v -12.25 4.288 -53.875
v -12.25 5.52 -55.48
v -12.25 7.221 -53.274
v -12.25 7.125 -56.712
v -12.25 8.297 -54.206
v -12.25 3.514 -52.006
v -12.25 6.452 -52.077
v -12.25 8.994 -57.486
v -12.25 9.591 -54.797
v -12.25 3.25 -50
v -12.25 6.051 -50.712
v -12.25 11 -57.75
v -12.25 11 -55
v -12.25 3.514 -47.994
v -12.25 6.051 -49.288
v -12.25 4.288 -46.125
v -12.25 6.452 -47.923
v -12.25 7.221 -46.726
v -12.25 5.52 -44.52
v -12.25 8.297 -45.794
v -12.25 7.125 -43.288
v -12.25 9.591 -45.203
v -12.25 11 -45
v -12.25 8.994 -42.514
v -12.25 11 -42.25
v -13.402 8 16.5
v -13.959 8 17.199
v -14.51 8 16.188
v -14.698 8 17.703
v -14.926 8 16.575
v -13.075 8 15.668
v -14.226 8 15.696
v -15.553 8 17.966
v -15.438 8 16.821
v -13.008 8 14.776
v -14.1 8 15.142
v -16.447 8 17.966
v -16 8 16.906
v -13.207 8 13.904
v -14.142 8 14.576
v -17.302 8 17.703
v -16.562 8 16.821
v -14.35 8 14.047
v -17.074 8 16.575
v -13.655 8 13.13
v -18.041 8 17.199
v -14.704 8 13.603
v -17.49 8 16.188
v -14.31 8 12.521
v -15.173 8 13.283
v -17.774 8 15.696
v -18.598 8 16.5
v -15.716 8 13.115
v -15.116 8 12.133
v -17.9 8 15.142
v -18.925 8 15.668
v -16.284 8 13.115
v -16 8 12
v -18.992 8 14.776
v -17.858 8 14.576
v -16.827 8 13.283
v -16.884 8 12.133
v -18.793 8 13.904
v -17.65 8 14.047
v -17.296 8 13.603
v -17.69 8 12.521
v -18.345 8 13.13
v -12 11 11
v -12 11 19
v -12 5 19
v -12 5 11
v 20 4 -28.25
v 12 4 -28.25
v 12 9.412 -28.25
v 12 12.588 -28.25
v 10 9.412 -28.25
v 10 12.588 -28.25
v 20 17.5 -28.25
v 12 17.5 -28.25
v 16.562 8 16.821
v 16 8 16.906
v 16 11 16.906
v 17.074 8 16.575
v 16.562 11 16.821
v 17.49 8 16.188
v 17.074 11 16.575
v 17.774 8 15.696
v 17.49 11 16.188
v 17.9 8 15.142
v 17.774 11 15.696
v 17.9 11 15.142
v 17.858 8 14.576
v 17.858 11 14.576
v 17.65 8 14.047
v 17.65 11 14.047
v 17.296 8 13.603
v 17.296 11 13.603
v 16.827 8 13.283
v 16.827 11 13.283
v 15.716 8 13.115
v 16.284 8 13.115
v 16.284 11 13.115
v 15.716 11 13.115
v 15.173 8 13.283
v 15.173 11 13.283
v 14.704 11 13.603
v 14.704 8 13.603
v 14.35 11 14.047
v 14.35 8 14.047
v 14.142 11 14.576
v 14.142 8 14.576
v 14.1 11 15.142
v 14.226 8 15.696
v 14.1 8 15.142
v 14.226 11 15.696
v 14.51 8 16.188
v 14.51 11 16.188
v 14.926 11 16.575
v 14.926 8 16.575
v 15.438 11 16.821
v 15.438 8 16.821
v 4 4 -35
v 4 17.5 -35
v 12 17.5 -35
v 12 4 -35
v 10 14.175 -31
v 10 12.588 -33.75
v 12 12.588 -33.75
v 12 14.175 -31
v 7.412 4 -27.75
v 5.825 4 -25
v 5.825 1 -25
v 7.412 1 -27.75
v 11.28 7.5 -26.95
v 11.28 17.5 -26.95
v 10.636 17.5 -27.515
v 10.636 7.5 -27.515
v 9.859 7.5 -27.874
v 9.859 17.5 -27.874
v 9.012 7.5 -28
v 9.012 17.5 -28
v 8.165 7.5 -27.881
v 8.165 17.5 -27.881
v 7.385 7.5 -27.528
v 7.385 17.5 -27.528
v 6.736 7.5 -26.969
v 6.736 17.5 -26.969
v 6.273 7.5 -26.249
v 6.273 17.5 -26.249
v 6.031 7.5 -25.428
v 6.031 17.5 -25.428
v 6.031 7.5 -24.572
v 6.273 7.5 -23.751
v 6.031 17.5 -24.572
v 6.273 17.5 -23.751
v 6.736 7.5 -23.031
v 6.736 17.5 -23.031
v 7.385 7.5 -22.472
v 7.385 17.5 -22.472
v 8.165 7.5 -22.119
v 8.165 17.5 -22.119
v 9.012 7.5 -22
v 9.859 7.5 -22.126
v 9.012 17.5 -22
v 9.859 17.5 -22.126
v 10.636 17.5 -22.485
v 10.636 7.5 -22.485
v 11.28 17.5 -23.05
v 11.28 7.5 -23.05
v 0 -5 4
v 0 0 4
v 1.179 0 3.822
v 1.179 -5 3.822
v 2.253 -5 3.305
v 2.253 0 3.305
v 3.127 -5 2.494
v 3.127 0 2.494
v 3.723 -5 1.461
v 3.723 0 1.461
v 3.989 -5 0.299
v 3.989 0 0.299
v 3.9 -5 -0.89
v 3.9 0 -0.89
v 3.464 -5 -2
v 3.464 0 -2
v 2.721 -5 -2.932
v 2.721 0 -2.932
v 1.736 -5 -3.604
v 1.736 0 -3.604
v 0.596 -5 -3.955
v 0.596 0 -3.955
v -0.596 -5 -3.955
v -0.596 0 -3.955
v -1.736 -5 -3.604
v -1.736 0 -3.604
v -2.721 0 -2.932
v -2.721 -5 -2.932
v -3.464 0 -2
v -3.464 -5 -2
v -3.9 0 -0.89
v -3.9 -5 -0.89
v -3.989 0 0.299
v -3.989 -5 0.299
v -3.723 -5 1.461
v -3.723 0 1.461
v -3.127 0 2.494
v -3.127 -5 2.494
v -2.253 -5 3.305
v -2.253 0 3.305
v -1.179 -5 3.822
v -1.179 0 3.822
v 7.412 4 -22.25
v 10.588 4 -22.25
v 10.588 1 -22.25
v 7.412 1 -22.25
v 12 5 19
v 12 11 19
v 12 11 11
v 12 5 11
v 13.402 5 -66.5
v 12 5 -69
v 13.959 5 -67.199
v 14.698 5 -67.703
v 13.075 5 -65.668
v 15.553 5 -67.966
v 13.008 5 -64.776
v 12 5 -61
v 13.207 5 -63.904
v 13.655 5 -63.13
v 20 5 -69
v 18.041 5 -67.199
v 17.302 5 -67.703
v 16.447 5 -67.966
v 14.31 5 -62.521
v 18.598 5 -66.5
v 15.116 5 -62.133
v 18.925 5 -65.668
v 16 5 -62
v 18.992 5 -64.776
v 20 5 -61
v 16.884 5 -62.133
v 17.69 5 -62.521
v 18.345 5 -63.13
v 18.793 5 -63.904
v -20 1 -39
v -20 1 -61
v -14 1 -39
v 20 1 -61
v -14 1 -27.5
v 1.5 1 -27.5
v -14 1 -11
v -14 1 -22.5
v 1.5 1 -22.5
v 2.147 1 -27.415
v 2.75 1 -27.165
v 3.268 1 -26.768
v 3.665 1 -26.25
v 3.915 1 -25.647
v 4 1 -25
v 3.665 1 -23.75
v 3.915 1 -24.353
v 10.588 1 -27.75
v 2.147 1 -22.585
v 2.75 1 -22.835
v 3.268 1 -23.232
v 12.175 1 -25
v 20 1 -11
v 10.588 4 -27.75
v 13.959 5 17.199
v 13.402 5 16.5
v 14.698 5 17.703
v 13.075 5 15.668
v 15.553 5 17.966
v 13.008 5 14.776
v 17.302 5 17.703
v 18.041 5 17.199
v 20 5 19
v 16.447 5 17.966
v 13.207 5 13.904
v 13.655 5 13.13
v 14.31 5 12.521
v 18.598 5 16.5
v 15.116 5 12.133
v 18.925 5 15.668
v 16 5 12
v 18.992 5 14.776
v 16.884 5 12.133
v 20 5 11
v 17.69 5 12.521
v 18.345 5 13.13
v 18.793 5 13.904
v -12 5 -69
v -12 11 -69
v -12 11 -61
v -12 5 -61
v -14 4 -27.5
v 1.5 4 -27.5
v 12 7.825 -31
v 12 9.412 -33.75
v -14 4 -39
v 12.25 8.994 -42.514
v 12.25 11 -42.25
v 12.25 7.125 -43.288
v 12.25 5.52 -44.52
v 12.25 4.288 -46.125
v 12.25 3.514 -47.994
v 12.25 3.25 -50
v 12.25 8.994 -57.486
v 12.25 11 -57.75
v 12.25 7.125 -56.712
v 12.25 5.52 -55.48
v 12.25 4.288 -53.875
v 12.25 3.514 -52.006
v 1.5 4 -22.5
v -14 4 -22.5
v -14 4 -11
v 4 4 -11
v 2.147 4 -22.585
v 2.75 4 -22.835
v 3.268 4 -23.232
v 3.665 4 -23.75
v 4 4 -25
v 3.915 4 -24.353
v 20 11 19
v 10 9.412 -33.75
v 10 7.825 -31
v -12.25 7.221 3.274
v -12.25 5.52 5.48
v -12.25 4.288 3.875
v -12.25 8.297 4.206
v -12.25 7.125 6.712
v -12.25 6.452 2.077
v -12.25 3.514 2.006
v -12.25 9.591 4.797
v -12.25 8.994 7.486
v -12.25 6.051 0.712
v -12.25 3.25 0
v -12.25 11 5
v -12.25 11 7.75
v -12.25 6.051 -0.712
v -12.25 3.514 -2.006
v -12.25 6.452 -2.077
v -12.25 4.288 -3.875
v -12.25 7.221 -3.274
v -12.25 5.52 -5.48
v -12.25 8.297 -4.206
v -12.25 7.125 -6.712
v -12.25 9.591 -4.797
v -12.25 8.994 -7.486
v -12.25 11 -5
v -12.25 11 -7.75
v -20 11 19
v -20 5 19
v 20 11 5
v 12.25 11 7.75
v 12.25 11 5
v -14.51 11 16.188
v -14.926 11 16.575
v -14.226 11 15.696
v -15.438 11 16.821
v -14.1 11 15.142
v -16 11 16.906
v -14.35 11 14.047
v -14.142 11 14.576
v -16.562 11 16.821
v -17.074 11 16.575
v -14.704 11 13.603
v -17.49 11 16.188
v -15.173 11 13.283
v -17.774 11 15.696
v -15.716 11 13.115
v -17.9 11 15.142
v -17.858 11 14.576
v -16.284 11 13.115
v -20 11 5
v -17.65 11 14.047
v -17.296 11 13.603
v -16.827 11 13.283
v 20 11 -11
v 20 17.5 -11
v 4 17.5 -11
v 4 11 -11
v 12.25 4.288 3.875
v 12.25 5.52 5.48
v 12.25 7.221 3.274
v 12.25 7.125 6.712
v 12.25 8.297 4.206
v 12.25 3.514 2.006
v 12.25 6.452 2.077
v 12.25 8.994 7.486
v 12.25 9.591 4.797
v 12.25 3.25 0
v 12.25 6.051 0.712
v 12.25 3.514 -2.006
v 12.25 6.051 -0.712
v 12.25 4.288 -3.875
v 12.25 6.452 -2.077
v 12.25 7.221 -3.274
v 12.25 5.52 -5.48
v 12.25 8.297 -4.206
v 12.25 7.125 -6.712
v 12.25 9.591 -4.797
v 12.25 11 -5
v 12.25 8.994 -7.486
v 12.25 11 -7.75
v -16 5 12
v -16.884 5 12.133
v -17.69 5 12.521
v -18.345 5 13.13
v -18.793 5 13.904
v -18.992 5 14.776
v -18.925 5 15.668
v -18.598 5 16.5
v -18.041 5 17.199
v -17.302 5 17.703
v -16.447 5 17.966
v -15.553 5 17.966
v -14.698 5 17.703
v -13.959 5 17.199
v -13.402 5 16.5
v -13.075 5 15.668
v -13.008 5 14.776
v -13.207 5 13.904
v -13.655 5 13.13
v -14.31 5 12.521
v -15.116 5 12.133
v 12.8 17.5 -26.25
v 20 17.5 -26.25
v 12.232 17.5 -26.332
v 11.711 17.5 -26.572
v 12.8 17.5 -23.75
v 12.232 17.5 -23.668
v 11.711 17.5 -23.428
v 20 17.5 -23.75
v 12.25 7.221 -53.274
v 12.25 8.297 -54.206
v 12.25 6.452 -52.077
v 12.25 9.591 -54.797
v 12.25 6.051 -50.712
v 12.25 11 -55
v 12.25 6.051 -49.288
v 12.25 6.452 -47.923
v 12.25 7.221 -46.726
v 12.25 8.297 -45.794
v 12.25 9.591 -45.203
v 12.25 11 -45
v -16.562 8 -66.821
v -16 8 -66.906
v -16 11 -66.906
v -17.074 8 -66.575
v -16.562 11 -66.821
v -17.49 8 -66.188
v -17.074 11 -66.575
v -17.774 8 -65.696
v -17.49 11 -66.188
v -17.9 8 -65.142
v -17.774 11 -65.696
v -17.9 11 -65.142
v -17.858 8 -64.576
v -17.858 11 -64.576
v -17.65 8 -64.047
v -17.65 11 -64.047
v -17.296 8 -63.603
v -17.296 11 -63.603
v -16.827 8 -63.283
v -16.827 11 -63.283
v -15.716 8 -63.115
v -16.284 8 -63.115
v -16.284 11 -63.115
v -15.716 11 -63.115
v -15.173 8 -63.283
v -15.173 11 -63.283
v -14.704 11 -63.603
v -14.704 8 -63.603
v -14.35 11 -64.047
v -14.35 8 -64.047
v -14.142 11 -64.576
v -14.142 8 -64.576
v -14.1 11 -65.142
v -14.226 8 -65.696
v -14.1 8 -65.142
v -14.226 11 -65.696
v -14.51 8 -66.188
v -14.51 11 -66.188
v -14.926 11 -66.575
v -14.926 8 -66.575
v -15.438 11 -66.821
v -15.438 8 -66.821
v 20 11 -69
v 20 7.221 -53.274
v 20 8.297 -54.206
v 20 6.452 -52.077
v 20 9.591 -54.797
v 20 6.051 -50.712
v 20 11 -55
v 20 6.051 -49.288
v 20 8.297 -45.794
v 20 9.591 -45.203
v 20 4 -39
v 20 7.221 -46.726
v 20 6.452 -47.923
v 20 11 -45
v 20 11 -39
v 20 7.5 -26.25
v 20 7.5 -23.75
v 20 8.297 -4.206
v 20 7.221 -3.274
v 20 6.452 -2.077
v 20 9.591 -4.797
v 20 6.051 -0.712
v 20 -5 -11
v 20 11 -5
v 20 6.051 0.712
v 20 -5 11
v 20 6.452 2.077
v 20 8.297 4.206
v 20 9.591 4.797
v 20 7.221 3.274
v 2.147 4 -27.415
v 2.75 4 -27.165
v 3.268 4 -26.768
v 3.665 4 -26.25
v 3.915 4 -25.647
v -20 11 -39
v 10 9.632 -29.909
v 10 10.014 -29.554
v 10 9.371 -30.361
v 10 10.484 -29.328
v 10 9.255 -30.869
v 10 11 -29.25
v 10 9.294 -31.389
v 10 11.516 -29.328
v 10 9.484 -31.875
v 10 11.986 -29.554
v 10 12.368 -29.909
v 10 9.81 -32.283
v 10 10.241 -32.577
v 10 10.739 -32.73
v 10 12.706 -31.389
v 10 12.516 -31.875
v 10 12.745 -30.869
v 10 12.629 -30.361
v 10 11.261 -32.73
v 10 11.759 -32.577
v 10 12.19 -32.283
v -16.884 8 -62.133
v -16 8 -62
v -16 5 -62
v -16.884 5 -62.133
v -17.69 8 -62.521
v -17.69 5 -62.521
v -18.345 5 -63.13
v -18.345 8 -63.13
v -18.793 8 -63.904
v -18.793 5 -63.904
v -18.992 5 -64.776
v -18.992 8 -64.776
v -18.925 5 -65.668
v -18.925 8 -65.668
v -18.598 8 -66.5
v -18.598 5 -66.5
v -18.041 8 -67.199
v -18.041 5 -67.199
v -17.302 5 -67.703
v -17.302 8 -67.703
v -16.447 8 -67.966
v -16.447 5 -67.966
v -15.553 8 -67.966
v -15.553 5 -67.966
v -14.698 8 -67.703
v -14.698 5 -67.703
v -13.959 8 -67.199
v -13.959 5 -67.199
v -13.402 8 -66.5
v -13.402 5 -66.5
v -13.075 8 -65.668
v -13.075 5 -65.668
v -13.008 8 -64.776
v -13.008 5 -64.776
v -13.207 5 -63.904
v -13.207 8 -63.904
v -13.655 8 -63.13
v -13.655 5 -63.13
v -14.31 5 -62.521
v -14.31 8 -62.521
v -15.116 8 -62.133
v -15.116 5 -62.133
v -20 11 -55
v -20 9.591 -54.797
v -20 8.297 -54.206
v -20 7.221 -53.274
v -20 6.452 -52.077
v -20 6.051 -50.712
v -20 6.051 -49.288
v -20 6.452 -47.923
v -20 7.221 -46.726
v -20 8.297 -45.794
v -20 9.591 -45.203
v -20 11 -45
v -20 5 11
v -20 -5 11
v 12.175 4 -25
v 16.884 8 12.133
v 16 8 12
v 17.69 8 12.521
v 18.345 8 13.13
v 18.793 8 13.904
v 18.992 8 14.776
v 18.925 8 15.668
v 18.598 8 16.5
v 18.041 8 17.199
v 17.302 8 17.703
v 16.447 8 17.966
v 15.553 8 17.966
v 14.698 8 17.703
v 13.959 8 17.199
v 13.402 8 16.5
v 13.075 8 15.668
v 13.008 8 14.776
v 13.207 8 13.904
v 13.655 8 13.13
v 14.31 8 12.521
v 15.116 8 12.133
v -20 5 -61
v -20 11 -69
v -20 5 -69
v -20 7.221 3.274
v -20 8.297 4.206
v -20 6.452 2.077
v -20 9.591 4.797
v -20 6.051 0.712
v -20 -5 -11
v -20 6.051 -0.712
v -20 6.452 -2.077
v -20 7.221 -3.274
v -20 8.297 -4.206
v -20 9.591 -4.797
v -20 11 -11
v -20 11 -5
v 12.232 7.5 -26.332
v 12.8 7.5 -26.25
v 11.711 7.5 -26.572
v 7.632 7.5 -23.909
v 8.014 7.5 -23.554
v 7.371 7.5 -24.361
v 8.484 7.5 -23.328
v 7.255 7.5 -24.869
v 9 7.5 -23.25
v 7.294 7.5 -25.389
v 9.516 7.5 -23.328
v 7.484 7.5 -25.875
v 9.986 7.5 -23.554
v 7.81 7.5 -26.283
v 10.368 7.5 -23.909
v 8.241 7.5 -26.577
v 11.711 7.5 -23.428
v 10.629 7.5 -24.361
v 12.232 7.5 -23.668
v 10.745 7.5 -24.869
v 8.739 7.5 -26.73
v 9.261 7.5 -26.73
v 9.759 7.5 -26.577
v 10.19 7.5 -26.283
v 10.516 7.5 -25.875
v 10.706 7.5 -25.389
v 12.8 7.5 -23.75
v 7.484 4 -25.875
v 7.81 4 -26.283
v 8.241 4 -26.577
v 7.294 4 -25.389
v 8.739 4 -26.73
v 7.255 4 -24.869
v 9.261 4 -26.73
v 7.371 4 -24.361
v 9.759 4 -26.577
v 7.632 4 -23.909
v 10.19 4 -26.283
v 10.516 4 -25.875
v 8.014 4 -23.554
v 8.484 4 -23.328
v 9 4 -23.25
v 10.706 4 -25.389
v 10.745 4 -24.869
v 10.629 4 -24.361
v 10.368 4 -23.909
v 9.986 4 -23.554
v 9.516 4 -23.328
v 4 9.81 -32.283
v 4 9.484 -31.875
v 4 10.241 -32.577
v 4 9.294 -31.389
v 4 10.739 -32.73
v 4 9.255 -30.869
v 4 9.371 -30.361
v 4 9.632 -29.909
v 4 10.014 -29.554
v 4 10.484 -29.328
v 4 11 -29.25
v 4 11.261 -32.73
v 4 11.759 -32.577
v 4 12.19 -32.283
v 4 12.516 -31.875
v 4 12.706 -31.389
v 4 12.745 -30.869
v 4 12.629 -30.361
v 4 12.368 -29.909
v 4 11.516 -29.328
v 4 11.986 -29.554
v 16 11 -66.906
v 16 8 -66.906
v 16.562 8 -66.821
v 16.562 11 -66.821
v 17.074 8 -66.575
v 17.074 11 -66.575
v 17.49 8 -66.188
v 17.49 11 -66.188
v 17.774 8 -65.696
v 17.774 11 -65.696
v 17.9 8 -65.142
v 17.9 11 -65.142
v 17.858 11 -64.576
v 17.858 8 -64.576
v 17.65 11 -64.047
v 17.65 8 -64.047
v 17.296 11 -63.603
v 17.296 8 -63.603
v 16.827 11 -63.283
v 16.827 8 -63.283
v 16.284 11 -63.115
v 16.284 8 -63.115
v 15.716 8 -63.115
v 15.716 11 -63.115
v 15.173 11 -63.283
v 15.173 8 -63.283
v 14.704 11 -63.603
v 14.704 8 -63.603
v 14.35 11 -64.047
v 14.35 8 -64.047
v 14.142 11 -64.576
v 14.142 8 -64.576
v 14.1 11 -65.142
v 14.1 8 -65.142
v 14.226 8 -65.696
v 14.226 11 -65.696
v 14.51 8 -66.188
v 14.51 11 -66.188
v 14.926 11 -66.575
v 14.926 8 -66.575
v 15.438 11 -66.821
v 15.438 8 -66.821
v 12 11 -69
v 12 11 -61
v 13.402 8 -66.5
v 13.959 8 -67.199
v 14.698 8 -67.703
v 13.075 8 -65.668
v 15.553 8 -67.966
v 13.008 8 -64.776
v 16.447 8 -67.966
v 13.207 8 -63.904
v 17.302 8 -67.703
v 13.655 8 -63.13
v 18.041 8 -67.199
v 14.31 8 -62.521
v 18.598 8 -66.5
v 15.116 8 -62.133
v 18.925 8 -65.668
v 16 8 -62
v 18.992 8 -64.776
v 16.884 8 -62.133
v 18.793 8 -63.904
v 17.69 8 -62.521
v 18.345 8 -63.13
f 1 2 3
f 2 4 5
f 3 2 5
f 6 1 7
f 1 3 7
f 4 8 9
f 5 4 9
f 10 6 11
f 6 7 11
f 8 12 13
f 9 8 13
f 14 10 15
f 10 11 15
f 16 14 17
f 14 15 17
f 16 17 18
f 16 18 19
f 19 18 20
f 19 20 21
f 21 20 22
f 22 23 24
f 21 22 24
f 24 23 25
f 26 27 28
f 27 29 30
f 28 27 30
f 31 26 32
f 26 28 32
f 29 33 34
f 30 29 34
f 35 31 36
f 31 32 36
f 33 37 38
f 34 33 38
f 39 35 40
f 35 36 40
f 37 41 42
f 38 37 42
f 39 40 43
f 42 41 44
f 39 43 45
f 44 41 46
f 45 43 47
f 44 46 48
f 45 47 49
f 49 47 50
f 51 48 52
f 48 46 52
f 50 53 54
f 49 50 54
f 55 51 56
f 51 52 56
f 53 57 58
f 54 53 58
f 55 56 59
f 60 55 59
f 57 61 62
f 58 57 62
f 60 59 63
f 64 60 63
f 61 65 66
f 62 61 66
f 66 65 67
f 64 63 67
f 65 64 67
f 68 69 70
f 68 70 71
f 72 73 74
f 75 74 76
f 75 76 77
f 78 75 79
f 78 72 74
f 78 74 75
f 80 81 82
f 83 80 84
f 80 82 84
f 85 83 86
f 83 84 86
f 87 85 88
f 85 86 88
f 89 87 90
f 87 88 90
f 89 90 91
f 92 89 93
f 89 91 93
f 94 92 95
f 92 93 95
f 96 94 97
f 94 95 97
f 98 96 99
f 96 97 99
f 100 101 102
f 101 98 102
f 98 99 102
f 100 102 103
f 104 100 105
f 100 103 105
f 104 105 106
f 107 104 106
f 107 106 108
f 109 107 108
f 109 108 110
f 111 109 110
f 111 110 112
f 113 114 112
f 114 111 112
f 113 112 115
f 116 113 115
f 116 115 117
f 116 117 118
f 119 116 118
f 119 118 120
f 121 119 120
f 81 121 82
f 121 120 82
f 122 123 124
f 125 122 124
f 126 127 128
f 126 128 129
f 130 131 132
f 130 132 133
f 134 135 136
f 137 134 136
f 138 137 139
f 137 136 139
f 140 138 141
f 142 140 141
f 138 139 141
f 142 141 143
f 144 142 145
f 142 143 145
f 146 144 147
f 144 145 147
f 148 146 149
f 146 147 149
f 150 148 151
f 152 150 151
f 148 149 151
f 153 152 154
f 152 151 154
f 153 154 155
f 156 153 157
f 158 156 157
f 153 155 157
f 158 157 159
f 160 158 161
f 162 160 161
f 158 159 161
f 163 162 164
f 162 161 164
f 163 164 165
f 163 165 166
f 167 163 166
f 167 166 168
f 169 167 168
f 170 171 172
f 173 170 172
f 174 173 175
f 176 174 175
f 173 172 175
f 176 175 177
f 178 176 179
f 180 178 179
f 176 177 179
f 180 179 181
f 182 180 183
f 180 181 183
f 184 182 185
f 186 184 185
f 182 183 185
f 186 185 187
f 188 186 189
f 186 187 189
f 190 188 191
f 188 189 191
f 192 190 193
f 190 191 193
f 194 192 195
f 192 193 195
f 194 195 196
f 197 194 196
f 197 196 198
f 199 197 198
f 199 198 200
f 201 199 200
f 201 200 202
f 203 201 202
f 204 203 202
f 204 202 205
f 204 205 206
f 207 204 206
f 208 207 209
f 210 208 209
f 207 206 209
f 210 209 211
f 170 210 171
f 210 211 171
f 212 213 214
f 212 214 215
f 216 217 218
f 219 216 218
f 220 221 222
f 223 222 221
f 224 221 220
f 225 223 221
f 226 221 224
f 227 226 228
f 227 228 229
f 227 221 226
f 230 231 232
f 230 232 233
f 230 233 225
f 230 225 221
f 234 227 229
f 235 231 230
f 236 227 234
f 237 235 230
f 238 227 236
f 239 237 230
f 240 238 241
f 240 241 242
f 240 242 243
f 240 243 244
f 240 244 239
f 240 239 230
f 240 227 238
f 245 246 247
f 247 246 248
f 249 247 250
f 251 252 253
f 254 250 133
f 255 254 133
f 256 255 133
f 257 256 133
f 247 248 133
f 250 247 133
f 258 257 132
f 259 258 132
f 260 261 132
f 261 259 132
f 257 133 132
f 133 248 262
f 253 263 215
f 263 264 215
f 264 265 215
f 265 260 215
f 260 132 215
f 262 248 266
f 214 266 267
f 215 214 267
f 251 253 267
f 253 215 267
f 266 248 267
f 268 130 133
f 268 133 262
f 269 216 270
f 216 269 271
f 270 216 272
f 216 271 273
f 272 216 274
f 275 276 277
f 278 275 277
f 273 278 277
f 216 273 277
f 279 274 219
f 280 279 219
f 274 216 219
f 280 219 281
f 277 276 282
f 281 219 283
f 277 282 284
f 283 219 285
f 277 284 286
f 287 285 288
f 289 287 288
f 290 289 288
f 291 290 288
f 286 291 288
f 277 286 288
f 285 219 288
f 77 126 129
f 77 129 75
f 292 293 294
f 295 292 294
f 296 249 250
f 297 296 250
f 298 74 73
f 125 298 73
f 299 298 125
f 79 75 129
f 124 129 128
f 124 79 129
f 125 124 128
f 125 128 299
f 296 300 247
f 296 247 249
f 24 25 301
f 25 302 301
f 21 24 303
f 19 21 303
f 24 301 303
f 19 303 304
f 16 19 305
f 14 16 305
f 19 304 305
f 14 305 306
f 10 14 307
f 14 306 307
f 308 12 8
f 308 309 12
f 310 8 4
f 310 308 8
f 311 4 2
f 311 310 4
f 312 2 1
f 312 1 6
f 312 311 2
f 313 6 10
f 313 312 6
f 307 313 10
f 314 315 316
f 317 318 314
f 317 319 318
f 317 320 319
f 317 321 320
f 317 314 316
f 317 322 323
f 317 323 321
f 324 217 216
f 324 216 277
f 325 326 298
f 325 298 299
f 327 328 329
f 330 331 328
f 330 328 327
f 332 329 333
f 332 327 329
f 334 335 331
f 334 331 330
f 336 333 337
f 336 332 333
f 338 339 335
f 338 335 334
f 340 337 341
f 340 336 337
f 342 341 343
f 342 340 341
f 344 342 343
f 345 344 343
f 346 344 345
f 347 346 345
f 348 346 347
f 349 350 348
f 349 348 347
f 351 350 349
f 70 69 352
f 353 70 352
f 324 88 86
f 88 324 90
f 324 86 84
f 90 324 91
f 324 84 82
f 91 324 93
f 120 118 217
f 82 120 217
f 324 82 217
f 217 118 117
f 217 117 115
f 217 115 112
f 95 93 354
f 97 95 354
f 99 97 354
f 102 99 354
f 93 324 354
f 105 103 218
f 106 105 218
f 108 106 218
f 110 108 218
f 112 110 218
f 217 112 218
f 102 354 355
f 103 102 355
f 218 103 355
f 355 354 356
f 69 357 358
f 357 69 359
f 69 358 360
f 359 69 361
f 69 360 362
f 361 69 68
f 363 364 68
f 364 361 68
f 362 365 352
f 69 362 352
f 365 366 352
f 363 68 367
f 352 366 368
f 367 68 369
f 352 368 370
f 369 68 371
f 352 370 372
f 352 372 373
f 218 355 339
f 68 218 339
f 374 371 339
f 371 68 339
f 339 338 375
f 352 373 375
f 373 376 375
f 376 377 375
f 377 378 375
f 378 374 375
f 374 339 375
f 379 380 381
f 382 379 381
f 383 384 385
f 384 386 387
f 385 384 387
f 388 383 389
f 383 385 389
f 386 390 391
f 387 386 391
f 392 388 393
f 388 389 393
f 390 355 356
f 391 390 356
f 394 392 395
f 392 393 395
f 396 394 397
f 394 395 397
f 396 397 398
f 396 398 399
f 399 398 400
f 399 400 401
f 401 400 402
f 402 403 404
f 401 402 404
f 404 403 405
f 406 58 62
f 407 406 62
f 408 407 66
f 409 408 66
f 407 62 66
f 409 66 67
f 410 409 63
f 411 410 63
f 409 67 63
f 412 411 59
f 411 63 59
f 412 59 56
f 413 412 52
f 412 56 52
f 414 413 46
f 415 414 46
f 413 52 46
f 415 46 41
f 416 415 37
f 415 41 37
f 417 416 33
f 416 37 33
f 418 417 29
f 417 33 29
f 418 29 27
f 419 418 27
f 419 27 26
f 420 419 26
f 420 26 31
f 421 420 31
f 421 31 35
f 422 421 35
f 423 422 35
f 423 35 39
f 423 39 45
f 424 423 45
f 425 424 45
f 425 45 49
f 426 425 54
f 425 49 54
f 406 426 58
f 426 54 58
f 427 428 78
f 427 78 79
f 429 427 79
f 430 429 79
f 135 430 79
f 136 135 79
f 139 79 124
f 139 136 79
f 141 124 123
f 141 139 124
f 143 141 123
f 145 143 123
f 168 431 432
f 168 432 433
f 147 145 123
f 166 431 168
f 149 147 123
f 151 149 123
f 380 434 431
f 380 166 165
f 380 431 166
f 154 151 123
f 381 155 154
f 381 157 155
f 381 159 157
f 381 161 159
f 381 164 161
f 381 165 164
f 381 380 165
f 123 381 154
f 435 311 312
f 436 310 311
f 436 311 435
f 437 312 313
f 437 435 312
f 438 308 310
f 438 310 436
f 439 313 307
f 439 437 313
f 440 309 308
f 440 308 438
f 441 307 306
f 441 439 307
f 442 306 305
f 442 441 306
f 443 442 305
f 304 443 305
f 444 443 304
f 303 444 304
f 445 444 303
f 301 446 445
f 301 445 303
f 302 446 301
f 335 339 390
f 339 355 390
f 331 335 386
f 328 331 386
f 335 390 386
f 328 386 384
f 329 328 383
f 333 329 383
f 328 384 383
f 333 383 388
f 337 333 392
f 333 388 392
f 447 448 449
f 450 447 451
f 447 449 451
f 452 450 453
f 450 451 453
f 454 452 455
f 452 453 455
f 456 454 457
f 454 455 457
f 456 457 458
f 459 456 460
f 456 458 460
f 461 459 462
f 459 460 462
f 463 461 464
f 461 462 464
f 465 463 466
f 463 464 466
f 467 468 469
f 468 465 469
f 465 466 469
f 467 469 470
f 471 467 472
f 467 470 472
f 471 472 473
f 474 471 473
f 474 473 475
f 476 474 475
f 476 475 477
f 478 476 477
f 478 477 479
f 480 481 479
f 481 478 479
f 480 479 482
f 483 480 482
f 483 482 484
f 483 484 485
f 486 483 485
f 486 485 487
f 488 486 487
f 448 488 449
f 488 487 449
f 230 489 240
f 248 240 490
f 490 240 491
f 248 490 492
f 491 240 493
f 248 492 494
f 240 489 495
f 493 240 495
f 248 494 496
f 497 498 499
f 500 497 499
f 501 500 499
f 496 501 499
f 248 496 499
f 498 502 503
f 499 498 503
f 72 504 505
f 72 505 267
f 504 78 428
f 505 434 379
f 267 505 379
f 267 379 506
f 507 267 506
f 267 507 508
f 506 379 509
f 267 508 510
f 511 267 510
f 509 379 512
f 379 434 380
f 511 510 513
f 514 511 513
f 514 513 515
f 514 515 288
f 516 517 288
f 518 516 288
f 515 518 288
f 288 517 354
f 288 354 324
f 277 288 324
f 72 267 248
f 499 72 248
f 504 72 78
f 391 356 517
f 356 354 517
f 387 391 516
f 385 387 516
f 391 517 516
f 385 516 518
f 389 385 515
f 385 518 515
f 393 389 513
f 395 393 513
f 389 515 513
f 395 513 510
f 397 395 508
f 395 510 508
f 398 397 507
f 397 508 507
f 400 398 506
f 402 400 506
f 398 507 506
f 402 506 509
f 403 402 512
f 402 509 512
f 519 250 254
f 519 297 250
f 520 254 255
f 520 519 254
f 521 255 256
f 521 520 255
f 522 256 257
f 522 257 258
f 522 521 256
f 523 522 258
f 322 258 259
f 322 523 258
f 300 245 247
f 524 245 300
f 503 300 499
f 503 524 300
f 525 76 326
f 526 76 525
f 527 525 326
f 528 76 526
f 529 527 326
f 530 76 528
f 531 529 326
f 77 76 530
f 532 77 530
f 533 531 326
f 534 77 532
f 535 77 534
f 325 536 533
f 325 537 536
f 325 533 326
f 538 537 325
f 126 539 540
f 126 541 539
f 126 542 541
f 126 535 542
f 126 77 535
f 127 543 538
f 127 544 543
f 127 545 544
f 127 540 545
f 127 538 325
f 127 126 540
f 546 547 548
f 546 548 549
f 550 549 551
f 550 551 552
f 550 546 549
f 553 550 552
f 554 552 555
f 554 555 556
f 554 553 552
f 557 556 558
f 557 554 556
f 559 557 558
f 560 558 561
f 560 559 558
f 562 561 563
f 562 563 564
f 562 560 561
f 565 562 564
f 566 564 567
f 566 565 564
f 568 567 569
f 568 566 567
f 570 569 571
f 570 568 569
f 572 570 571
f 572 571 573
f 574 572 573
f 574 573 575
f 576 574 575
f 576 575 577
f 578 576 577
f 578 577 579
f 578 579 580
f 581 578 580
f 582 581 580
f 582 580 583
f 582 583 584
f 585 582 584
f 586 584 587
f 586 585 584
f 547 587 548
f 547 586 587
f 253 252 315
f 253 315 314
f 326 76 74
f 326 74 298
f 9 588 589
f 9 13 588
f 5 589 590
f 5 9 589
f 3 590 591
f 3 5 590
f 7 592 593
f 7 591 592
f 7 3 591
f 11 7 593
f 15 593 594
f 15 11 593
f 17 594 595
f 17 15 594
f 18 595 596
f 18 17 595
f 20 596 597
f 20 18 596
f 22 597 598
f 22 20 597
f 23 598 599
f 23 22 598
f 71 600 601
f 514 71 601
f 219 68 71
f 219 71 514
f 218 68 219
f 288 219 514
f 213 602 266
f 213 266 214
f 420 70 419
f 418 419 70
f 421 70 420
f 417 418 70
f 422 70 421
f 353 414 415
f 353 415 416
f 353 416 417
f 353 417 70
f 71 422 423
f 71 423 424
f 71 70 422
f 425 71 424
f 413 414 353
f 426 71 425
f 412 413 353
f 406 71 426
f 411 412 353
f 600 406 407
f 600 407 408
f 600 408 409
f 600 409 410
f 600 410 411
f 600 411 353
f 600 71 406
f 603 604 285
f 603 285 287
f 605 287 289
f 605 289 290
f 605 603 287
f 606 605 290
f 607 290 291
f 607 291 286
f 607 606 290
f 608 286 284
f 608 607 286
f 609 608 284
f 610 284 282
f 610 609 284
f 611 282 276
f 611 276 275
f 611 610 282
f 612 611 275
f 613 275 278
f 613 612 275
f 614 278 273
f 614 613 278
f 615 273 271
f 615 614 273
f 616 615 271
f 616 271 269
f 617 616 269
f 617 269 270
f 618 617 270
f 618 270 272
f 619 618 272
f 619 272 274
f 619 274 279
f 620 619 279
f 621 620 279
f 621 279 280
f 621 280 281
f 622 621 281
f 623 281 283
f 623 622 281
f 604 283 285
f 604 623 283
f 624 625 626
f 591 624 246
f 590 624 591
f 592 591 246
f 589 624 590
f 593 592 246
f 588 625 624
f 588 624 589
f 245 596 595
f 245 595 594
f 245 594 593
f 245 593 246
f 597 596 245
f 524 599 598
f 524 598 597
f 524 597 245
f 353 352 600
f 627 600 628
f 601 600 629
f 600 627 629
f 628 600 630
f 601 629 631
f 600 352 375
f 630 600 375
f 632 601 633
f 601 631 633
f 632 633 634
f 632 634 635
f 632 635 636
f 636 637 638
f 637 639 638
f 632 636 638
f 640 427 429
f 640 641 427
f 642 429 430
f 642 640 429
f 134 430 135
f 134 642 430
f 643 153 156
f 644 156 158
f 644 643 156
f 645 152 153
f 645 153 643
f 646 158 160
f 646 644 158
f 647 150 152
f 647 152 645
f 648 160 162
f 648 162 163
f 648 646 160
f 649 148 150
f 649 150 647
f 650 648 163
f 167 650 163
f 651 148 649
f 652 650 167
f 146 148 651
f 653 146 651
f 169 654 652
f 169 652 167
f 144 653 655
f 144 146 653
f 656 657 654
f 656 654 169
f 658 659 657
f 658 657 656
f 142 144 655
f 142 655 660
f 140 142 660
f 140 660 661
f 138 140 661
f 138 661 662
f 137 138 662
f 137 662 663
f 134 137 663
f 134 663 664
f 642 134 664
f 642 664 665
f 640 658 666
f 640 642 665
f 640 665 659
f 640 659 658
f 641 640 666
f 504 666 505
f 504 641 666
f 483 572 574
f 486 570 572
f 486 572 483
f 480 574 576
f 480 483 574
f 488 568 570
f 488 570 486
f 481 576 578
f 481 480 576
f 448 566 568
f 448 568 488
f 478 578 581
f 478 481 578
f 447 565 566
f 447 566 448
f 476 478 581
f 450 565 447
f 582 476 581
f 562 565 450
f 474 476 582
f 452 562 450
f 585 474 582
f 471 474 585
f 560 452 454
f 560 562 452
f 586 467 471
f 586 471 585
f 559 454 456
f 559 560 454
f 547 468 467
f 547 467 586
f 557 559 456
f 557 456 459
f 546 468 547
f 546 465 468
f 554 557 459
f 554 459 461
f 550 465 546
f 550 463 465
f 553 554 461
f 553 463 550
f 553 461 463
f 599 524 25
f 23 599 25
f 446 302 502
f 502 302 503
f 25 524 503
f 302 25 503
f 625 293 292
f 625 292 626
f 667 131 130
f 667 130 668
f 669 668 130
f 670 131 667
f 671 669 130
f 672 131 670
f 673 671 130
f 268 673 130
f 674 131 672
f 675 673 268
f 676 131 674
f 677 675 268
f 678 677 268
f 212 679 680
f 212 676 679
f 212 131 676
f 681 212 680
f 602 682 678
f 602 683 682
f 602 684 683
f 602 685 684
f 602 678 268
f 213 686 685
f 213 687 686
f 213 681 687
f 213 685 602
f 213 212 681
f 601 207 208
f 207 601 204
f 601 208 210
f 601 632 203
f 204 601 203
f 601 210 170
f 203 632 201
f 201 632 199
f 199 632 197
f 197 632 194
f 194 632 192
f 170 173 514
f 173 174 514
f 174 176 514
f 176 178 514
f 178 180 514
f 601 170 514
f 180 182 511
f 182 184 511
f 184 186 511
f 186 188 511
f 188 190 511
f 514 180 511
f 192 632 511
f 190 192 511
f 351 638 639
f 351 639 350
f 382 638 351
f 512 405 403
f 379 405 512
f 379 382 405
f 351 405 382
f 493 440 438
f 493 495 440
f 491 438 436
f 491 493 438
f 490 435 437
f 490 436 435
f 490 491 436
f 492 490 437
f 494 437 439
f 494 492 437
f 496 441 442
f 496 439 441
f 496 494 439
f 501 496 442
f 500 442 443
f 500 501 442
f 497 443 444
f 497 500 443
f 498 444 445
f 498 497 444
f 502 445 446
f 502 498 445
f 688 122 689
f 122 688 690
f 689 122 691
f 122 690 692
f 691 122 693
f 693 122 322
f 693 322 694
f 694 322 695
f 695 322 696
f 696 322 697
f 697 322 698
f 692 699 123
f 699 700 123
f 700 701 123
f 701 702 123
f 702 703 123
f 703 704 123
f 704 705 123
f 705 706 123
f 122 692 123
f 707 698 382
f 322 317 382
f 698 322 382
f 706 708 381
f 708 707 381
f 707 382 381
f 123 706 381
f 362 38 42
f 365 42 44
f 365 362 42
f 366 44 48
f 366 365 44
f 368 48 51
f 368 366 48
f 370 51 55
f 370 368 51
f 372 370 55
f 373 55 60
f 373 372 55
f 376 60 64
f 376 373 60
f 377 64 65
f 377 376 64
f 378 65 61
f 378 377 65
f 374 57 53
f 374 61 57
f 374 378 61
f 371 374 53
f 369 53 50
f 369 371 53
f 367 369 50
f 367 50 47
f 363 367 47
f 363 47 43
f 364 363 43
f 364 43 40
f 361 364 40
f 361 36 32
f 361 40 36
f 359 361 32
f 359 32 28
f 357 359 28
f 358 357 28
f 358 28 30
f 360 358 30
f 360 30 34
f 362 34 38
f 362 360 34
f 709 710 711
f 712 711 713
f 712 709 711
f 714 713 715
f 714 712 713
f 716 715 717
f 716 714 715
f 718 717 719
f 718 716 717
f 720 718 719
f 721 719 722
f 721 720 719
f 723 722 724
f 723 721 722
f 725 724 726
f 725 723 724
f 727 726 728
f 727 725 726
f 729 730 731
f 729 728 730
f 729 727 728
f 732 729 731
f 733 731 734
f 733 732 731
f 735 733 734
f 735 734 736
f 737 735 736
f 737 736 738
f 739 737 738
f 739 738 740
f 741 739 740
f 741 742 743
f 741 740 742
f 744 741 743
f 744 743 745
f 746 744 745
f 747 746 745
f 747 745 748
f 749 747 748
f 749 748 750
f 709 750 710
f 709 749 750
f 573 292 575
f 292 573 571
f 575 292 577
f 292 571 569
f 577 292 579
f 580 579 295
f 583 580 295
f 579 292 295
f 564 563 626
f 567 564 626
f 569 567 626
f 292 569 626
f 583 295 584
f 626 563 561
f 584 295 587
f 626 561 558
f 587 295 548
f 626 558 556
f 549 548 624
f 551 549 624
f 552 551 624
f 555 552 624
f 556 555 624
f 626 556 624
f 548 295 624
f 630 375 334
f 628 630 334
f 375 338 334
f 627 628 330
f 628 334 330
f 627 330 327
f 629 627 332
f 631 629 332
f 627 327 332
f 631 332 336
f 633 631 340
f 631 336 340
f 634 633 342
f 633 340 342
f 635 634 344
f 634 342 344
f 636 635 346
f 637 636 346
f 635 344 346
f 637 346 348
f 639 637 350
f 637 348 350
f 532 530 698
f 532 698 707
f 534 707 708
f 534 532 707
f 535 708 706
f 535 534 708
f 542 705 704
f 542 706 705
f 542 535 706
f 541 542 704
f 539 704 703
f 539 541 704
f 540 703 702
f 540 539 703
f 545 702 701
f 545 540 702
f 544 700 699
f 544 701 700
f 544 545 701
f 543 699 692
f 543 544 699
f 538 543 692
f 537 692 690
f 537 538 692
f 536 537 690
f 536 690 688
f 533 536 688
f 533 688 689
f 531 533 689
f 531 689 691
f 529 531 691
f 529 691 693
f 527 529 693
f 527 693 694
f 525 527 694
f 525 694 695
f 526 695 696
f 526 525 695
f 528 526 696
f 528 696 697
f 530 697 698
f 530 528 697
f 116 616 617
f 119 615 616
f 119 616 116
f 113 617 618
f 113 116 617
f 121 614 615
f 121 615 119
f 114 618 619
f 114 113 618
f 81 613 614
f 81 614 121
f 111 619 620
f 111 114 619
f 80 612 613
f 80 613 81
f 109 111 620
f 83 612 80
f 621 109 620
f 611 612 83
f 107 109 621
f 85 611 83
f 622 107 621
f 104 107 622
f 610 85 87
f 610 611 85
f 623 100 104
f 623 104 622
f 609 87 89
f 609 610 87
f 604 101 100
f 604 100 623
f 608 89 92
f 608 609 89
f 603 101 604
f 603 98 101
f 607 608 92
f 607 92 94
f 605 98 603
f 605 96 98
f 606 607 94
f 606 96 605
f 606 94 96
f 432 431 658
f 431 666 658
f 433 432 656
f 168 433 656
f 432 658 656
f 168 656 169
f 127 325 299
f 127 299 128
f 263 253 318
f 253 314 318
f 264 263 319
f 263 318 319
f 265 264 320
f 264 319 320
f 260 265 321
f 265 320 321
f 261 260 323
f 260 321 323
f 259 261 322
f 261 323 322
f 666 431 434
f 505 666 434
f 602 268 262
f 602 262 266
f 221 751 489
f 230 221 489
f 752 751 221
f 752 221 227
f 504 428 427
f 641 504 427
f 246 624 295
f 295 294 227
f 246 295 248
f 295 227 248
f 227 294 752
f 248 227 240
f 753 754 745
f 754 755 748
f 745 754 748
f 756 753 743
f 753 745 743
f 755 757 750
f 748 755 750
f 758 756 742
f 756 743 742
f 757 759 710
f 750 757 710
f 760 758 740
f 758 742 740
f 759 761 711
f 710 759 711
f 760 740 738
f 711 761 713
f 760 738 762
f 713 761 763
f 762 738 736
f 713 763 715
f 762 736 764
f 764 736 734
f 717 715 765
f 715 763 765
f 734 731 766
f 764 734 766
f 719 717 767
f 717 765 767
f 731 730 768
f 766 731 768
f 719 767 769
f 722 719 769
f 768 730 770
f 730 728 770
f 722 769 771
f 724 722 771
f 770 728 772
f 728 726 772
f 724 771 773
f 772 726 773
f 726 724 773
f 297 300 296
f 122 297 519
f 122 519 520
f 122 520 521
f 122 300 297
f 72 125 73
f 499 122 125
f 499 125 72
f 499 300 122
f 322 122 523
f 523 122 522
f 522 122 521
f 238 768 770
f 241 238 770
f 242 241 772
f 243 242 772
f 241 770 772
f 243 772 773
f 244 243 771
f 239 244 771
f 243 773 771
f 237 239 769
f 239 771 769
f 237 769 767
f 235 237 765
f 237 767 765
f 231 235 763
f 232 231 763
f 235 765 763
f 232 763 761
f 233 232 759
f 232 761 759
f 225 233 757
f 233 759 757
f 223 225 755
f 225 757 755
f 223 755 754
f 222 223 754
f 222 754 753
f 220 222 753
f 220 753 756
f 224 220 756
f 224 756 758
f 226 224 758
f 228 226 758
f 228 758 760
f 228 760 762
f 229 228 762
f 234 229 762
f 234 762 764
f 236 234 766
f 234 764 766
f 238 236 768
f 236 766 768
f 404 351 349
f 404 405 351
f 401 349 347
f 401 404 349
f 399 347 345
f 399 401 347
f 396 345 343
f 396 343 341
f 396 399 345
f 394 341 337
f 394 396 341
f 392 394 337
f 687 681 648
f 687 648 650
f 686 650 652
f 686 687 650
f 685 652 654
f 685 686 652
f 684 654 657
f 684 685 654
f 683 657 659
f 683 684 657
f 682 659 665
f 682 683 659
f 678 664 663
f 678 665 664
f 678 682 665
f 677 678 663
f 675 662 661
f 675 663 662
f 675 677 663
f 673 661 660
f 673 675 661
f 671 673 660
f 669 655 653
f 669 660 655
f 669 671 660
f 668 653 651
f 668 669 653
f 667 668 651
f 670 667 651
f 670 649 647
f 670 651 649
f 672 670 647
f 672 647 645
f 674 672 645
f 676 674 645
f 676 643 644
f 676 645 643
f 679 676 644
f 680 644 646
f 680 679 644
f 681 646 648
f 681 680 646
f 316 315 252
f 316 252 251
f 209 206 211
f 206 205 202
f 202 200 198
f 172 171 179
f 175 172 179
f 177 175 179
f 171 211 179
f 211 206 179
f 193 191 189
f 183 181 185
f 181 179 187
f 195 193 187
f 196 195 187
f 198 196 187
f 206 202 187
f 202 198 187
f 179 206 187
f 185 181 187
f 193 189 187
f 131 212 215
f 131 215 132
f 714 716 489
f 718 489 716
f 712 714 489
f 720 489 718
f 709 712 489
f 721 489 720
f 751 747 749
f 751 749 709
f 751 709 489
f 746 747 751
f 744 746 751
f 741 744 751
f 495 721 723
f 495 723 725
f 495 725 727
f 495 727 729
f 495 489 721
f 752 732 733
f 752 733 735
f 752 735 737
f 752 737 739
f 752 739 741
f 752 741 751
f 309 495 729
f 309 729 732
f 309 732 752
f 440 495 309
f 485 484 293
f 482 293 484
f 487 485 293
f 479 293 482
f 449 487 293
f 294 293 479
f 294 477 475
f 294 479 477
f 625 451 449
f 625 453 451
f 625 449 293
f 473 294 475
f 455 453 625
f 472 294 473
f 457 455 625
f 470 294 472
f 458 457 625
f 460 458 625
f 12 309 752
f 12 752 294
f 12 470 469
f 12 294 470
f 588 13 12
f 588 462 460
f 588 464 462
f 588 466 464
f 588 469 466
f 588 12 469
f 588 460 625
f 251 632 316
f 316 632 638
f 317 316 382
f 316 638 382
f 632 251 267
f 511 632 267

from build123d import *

# Parameters (mm, degrees)
SKETCH1_W                  = 40
SKETCH1_H                  = 22
BOSS_EXTRUDE1_DEPTH        = 11
SKETCH2_W                  = 40
SKETCH2_H                  = 22
SKETCH2_R                  = 4
BOSS_EXTRUDE2_DEPTH        = 5
SKETCH3_W                  = 24.5
SKETCH3_H                  = 15.5
CUT_EXTRUDE1_DEPTH         = 7.75
FILLET1_R                  = 7.75
SKETCH4_R                  = 5
CUT_EXTRUDE2_DEPTH         = 36.805900352
SKETCH5_W                  = 8
SKETCH5_H                  = 8
SKETCH5_R                  = 1.905800151
BOSS_EXTRUDE3_DEPTH        = 6
CUT_EXTRUDE3_START         = -3
SKETCH6_R                  = 3
SKETCH6_R_2                = 1.905800151
CUT_EXTRUDE3_DEPTH         = 3
SKETCH7_W                  = 16
SKETCH7_H                  = 16.5
BOSS_EXTRUDE5_DEPTH        = 28
MIRROR14_COPY_1_SKETCH_W   = 8
MIRROR14_COPY_1_SKETCH_H   = 8
MIRROR14_COPY_1_SKETCH_R   = 1.905800151
MIRROR14_COPY_1_DEPTH      = 6
MIRROR14_START             = -3
MIRROR14_COPY_2_SKETCH_R   = 3
MIRROR14_COPY_2_SKETCH_R_2 = 1.905800151
MIRROR14_COPY_2_DEPTH      = 3
FILLET1_OF_MIRROR14_R      = 7.75
SKETCH9_W                  = 28
SKETCH9_H                  = 3
BOSS_EXTRUDE6_DEPTH        = 18
CUT_EXTRUDE4_DEPTH         = 10
CUT_EXTRUDE5_DEPTH         = 73.919476136
CUT_EXTRUDE5_DEPTH_BACK    = 73.919476136
SKETCH11_R                 = 1.75
CUT_EXTRUDE6_DEPTH         = 76.121568141
CUT_EXTRUDE6_DEPTH_BACK    = 76.121568141
SKETCH12_R                 = 1.75
FILLET2_R                  = 2
CUT_EXTRUDE12_START        = -3
SKETCH17_R                 = 1.75
CUT_EXTRUDE12_DEPTH        = 3
CUT_EXTRUDE13_DEPTH        = 74.097537578
CUT_EXTRUDE13_DEPTH_BACK   = 74.097537578
SKETCH18_W                 = 18
SKETCH18_H                 = 5
FILLET3_R                  = 2.5
CUT_EXTRUDE14_DEPTH        = 74.710582687
CUT_EXTRUDE15_START        = -10
SKETCH21_R                 = 1.75
CUT_EXTRUDE15_DEPTH        = 10
SKETCH20_W                 = 36.163748027
SKETCH20_H                 = 4
CUT_EXTRUDE16_DEPTH        = 13.5
SKETCH22_W                 = 6.75
SKETCH22_H                 = 13.5
CUT_EXTRUDE18_DEPTH        = 8


with BuildPart() as part:
    # Sketch1 → Boss-Extrude1 (new body)
    with BuildSketch(Plane(origin=(0, 0, 0), x_dir=(1, 0, 0), z_dir=(0, 1, 0))):
        Rectangle(SKETCH1_W, SKETCH1_H)
    boss_extrude1 = extrude(amount=BOSS_EXTRUDE1_DEPTH)

    # Sketch2 → Boss-Extrude2 (add)
    with BuildSketch(Plane(origin=(0, 0, 0), x_dir=(1, 0, 0), z_dir=(0, 1, 0))):
        Rectangle(SKETCH2_W, SKETCH2_H)
        with Locations(Location((0, 0, 0), (0, 0, 270))):
            Circle(SKETCH2_R, mode=Mode.SUBTRACT)
    boss_extrude2 = extrude(amount=-BOSS_EXTRUDE2_DEPTH)

    # Sketch3 → Cut-Extrude1 (cut)
    with BuildSketch(Plane(origin=(0, 11, 0), x_dir=(1, 0, 0), z_dir=(0, 1, 0))):
        Rectangle(SKETCH3_W, SKETCH3_H)
    cut_extrude1 = extrude(amount=-CUT_EXTRUDE1_DEPTH, mode=Mode.SUBTRACT)

    # Fillet1
    fillet1_edges = [part.edges().sort_by_distance(p)[0] for p in [
        (0, 3.25, 7.75),
        (0, 3.25, -7.75),
    ]]
    fillet(fillet1_edges, radius=FILLET1_R - 0.0001)  # a hair under: the kernel refuses the full size

    # Sketch4 → Cut-Extrude2 (cut, symmetric)
    with BuildSketch(Plane(origin=(-12.25, 0, 0), x_dir=(0, 0, -1), z_dir=(1, 0, 0))):
        with Locations((0, 11)):
            Circle(SKETCH4_R)
    cut_extrude2 = extrude(amount=CUT_EXTRUDE2_DEPTH, both=True, mode=Mode.SUBTRACT)

    # Sketch5 → Boss-Extrude3 (add)
    with BuildSketch(Plane(origin=(0, 11, 0), x_dir=(1, 0, 0), z_dir=(0, 1, 0))):
        with Locations((16, -15)):
            Rectangle(SKETCH5_W, SKETCH5_H)
        with Locations(Location((16, -15, 0), (0, 0, 270))):
            Circle(SKETCH5_R, mode=Mode.SUBTRACT)
    boss_extrude3 = extrude(amount=-BOSS_EXTRUDE3_DEPTH)

    # Sketch6 → Cut-Extrude3 (cut)
    with BuildSketch(Plane.XZ.offset(-5).offset(CUT_EXTRUDE3_START)):
        with Locations(Location((16, 15, 0), (0, 0, 270))):
            Circle(SKETCH6_R)
        with Locations(Location((16, 15, 0), (0, 0, 90))):
            Circle(SKETCH6_R_2, mode=Mode.SUBTRACT)
    cut_extrude3 = extrude(amount=CUT_EXTRUDE3_DEPTH, mode=Mode.SUBTRACT)

    # Mirror8: Boss-Extrude3, Cut-Extrude3 across plane
    add(boss_extrude3.mirror(Plane(origin=(0, 0, 0), x_dir=(0, 0, 1), z_dir=(1, 0, 0))))
    add(cut_extrude3.mirror(Plane(origin=(0, 0, 0), x_dir=(0, 0, 1), z_dir=(1, 0, 0))), mode=Mode.SUBTRACT)

    # Sketch7 → Boss-Extrude5 (add)
    with BuildSketch(Plane(origin=(0, 0, -11), x_dir=(-1, 0, 0), z_dir=(0, 0, -1))):
        with Locations((-12, 9.25)):
            Rectangle(SKETCH7_W, SKETCH7_H)
    extrude(amount=BOSS_EXTRUDE5_DEPTH)

    # Mirror14: Boss-Extrude1, Boss-Extrude2, Cut-Extrude1, Cut-Extrude2, Boss-Extrude3, Cut-Extrude3 across plane
    add(boss_extrude1.mirror(Plane.XY.offset(-25)))
    add(boss_extrude2.mirror(Plane.XY.offset(-25)))
    add(cut_extrude1.mirror(Plane.XY.offset(-25)), mode=Mode.SUBTRACT)
    add(cut_extrude2.mirror(Plane.XY.offset(-25)), mode=Mode.SUBTRACT)
    add(boss_extrude3.mirror(Plane.XY.offset(-25)))
    add(cut_extrude3.mirror(Plane.XY.offset(-25)), mode=Mode.SUBTRACT)

    # Mirror14 copy 1 sketch → Mirror14 copy 1 (add)
    with BuildSketch(Plane(origin=(0, 11, -50), x_dir=(-1, 0, 0), z_dir=(0, 1, 0))):
        with Locations((16, -15)):
            Rectangle(MIRROR14_COPY_1_SKETCH_W, MIRROR14_COPY_1_SKETCH_H)
        with Locations(Location((16, -15, 0), (0, 0, 270))):
            Circle(MIRROR14_COPY_1_SKETCH_R, mode=Mode.SUBTRACT)
    extrude(amount=-MIRROR14_COPY_1_DEPTH)

    # Mirror14 copy 2 sketch → Mirror14 copy 2 (cut)
    with BuildSketch(Plane(origin=(0, 5, -50), x_dir=(-1, 0, 0), z_dir=(0, -1, 0)).offset(MIRROR14_START)):
        with Locations(Location((16, 15, 0), (0, 0, 270))):
            Circle(MIRROR14_COPY_2_SKETCH_R)
        with Locations(Location((16, 15, 0), (0, 0, 90))):
            Circle(MIRROR14_COPY_2_SKETCH_R_2, mode=Mode.SUBTRACT)
    extrude(amount=MIRROR14_COPY_2_DEPTH, mode=Mode.SUBTRACT)

    # Fillet1 of Mirror14
    fillet1_of_mirror14_edges = [part.edges().sort_by_distance(p)[0] for p in [
        (0, 3.25, -57.75),
        (0, 3.25, -42.25),
    ]]
    fillet(fillet1_of_mirror14_edges, radius=FILLET1_OF_MIRROR14_R - 0.0001)  # a hair under: the kernel refuses the full size

    # Sketch9 → Boss-Extrude6 (add)
    with BuildSketch(Plane.ZY.offset(-4)):
        with Locations((-25, 2.5)):
            Rectangle(SKETCH9_W, SKETCH9_H)
    extrude(amount=BOSS_EXTRUDE6_DEPTH)

    # Sketch10 → Cut-Extrude4 (cut)
    with BuildSketch(Plane(origin=(0, 17.5, 0), x_dir=(1, 0, 0), z_dir=(0, 1, 0))):
        with BuildLine():
            Line((9, 26.25), (9, 23.75))
            Line((9, 23.75), (11.727178029, 23.75))
            ThreePointArc((11.727178029, 23.75), (11.931001031, 24.360286817), (12, 25))
            ThreePointArc((12, 25), (11.931001031, 25.639713183), (11.727178029, 26.25))
            Line((11.727178029, 26.25), (9, 26.25))
        make_face()
        with BuildLine():
            Line((11.727178029, 23.75), (9, 23.75))
            Line((9, 23.75), (9, 26.25))
            Line((9, 26.25), (11.727178029, 26.25))
            ThreePointArc((11.727178029, 26.25), (6, 25), (11.727178029, 23.75))
        make_face()
        with BuildLine():
            ThreePointArc((12, 25), (11.931001031, 24.360286817), (11.727178029, 23.75))
            Line((11.727178029, 23.75), (20, 23.75))
            Line((20, 23.75), (20, 26.25))
            Line((20, 26.25), (11.727178029, 26.25))
            ThreePointArc((11.727178029, 26.25), (11.931001031, 25.639713183), (12, 25))
        make_face()
    extrude(amount=-CUT_EXTRUDE4_DEPTH, mode=Mode.SUBTRACT)

    # Sketch11 → Cut-Extrude5 (cut, two sides: drawn at the far end of the back side and taken through both)
    with BuildSketch(Plane(origin=(0, 7.5, 0), x_dir=(1, 0, 0), z_dir=(0, 1, 0)).offset(-CUT_EXTRUDE5_DEPTH_BACK)):
        with Locations(Location((9, 25, 0), (0, 0, 270))):
            Circle(SKETCH11_R)
    extrude(amount=CUT_EXTRUDE5_DEPTH + CUT_EXTRUDE5_DEPTH_BACK, mode=Mode.SUBTRACT)

    # Sketch12 → Cut-Extrude6 (cut, two sides: drawn at the far end of the back side and taken through both)
    with BuildSketch(Plane.ZY.offset(-4).offset(-CUT_EXTRUDE6_DEPTH_BACK)):
        with Locations((-31, 11)):
            Circle(SKETCH12_R)
    extrude(amount=CUT_EXTRUDE6_DEPTH + CUT_EXTRUDE6_DEPTH_BACK, mode=Mode.SUBTRACT)

    # Fillet2
    fillet2_edges = [part.edges().sort_by_distance(p)[0] for p in [
        (11.727178029, 12.5, -23.75),
        (11.727178029, 12.5, -26.25),
    ]]
    fillet(fillet2_edges, radius=FILLET2_R)

    # Sketch17 → Cut-Extrude12 (cut)
    with BuildSketch(Plane.XZ.offset(-1).offset(CUT_EXTRUDE12_START)):
        Polygon((12.175426481, -25), (10.58771324, -22.25), (7.41228676, -22.25), (5.824573519, -25), (7.41228676, -27.75), (10.58771324, -27.75), align=None)
        with Locations(Location((9, -25, 0), (0, 0, 90))):
            Circle(SKETCH17_R, mode=Mode.SUBTRACT)
    extrude(amount=CUT_EXTRUDE12_DEPTH, mode=Mode.SUBTRACT)

    # Sketch18 → Cut-Extrude13 (cut, two sides: drawn at the far end of the back side and taken through both)
    with BuildSketch(Plane(origin=(0, 4, 0), x_dir=(1, 0, 0), z_dir=(0, 1, 0)).offset(-CUT_EXTRUDE13_DEPTH_BACK)):
        with Locations((-5, 25)):
            Rectangle(SKETCH18_W, SKETCH18_H)
    extrude(amount=CUT_EXTRUDE13_DEPTH + CUT_EXTRUDE13_DEPTH_BACK, mode=Mode.SUBTRACT)

    # Fillet3
    fillet3_edges = [part.edges().sort_by_distance(p)[0] for p in [
        (4, 2.5, -27.5),
        (4, 2.5, -22.5),
    ]]
    fillet(fillet3_edges, radius=FILLET3_R - 0.0001)  # a hair under: the kernel refuses the full size

    # Sketch19 → Cut-Extrude14 (cut, through all)
    with BuildSketch(Plane.XZ.offset(-1)):
        Polygon((20, -61), (20, -39), (-14, -39), (-20, -39), (-20, -61), align=None)
    extrude(amount=CUT_EXTRUDE14_DEPTH, mode=Mode.SUBTRACT)

    # Sketch21 → Cut-Extrude15 (cut)
    with BuildSketch(Plane(origin=(20, 0, 0), x_dir=(0, 0, -1), z_dir=(1, 0, 0)).offset(CUT_EXTRUDE15_START)):
        Polygon((31, 14.175426481), (28.25, 12.58771324), (28.25, 9.41228676), (31, 7.824573519), (33.75, 9.41228676), (33.75, 12.58771324), align=None)
        with Locations((31, 11)):
            Circle(SKETCH21_R, mode=Mode.SUBTRACT)
    extrude(amount=CUT_EXTRUDE15_DEPTH, mode=Mode.SUBTRACT)

    # Sketch20 → Cut-Extrude16 (cut)
    with BuildSketch(Plane(origin=(0, 17.5, 0), x_dir=(1, 0, 0), z_dir=(0, 1, 0))):
        with Locations((22.081874014, 37)):
            Rectangle(SKETCH20_W, SKETCH20_H)
    extrude(amount=-CUT_EXTRUDE16_DEPTH, mode=Mode.SUBTRACT)

    # Sketch22 → Cut-Extrude18 (cut)
    with BuildSketch(Plane(origin=(20, 0, 0), x_dir=(0, 0, -1), z_dir=(1, 0, 0))):
        with Locations((31.625, 10.75)):
            Rectangle(SKETCH22_W, SKETCH22_H)
    extrude(amount=-CUT_EXTRUDE18_DEPTH, mode=Mode.SUBTRACT)


solid = part.part
